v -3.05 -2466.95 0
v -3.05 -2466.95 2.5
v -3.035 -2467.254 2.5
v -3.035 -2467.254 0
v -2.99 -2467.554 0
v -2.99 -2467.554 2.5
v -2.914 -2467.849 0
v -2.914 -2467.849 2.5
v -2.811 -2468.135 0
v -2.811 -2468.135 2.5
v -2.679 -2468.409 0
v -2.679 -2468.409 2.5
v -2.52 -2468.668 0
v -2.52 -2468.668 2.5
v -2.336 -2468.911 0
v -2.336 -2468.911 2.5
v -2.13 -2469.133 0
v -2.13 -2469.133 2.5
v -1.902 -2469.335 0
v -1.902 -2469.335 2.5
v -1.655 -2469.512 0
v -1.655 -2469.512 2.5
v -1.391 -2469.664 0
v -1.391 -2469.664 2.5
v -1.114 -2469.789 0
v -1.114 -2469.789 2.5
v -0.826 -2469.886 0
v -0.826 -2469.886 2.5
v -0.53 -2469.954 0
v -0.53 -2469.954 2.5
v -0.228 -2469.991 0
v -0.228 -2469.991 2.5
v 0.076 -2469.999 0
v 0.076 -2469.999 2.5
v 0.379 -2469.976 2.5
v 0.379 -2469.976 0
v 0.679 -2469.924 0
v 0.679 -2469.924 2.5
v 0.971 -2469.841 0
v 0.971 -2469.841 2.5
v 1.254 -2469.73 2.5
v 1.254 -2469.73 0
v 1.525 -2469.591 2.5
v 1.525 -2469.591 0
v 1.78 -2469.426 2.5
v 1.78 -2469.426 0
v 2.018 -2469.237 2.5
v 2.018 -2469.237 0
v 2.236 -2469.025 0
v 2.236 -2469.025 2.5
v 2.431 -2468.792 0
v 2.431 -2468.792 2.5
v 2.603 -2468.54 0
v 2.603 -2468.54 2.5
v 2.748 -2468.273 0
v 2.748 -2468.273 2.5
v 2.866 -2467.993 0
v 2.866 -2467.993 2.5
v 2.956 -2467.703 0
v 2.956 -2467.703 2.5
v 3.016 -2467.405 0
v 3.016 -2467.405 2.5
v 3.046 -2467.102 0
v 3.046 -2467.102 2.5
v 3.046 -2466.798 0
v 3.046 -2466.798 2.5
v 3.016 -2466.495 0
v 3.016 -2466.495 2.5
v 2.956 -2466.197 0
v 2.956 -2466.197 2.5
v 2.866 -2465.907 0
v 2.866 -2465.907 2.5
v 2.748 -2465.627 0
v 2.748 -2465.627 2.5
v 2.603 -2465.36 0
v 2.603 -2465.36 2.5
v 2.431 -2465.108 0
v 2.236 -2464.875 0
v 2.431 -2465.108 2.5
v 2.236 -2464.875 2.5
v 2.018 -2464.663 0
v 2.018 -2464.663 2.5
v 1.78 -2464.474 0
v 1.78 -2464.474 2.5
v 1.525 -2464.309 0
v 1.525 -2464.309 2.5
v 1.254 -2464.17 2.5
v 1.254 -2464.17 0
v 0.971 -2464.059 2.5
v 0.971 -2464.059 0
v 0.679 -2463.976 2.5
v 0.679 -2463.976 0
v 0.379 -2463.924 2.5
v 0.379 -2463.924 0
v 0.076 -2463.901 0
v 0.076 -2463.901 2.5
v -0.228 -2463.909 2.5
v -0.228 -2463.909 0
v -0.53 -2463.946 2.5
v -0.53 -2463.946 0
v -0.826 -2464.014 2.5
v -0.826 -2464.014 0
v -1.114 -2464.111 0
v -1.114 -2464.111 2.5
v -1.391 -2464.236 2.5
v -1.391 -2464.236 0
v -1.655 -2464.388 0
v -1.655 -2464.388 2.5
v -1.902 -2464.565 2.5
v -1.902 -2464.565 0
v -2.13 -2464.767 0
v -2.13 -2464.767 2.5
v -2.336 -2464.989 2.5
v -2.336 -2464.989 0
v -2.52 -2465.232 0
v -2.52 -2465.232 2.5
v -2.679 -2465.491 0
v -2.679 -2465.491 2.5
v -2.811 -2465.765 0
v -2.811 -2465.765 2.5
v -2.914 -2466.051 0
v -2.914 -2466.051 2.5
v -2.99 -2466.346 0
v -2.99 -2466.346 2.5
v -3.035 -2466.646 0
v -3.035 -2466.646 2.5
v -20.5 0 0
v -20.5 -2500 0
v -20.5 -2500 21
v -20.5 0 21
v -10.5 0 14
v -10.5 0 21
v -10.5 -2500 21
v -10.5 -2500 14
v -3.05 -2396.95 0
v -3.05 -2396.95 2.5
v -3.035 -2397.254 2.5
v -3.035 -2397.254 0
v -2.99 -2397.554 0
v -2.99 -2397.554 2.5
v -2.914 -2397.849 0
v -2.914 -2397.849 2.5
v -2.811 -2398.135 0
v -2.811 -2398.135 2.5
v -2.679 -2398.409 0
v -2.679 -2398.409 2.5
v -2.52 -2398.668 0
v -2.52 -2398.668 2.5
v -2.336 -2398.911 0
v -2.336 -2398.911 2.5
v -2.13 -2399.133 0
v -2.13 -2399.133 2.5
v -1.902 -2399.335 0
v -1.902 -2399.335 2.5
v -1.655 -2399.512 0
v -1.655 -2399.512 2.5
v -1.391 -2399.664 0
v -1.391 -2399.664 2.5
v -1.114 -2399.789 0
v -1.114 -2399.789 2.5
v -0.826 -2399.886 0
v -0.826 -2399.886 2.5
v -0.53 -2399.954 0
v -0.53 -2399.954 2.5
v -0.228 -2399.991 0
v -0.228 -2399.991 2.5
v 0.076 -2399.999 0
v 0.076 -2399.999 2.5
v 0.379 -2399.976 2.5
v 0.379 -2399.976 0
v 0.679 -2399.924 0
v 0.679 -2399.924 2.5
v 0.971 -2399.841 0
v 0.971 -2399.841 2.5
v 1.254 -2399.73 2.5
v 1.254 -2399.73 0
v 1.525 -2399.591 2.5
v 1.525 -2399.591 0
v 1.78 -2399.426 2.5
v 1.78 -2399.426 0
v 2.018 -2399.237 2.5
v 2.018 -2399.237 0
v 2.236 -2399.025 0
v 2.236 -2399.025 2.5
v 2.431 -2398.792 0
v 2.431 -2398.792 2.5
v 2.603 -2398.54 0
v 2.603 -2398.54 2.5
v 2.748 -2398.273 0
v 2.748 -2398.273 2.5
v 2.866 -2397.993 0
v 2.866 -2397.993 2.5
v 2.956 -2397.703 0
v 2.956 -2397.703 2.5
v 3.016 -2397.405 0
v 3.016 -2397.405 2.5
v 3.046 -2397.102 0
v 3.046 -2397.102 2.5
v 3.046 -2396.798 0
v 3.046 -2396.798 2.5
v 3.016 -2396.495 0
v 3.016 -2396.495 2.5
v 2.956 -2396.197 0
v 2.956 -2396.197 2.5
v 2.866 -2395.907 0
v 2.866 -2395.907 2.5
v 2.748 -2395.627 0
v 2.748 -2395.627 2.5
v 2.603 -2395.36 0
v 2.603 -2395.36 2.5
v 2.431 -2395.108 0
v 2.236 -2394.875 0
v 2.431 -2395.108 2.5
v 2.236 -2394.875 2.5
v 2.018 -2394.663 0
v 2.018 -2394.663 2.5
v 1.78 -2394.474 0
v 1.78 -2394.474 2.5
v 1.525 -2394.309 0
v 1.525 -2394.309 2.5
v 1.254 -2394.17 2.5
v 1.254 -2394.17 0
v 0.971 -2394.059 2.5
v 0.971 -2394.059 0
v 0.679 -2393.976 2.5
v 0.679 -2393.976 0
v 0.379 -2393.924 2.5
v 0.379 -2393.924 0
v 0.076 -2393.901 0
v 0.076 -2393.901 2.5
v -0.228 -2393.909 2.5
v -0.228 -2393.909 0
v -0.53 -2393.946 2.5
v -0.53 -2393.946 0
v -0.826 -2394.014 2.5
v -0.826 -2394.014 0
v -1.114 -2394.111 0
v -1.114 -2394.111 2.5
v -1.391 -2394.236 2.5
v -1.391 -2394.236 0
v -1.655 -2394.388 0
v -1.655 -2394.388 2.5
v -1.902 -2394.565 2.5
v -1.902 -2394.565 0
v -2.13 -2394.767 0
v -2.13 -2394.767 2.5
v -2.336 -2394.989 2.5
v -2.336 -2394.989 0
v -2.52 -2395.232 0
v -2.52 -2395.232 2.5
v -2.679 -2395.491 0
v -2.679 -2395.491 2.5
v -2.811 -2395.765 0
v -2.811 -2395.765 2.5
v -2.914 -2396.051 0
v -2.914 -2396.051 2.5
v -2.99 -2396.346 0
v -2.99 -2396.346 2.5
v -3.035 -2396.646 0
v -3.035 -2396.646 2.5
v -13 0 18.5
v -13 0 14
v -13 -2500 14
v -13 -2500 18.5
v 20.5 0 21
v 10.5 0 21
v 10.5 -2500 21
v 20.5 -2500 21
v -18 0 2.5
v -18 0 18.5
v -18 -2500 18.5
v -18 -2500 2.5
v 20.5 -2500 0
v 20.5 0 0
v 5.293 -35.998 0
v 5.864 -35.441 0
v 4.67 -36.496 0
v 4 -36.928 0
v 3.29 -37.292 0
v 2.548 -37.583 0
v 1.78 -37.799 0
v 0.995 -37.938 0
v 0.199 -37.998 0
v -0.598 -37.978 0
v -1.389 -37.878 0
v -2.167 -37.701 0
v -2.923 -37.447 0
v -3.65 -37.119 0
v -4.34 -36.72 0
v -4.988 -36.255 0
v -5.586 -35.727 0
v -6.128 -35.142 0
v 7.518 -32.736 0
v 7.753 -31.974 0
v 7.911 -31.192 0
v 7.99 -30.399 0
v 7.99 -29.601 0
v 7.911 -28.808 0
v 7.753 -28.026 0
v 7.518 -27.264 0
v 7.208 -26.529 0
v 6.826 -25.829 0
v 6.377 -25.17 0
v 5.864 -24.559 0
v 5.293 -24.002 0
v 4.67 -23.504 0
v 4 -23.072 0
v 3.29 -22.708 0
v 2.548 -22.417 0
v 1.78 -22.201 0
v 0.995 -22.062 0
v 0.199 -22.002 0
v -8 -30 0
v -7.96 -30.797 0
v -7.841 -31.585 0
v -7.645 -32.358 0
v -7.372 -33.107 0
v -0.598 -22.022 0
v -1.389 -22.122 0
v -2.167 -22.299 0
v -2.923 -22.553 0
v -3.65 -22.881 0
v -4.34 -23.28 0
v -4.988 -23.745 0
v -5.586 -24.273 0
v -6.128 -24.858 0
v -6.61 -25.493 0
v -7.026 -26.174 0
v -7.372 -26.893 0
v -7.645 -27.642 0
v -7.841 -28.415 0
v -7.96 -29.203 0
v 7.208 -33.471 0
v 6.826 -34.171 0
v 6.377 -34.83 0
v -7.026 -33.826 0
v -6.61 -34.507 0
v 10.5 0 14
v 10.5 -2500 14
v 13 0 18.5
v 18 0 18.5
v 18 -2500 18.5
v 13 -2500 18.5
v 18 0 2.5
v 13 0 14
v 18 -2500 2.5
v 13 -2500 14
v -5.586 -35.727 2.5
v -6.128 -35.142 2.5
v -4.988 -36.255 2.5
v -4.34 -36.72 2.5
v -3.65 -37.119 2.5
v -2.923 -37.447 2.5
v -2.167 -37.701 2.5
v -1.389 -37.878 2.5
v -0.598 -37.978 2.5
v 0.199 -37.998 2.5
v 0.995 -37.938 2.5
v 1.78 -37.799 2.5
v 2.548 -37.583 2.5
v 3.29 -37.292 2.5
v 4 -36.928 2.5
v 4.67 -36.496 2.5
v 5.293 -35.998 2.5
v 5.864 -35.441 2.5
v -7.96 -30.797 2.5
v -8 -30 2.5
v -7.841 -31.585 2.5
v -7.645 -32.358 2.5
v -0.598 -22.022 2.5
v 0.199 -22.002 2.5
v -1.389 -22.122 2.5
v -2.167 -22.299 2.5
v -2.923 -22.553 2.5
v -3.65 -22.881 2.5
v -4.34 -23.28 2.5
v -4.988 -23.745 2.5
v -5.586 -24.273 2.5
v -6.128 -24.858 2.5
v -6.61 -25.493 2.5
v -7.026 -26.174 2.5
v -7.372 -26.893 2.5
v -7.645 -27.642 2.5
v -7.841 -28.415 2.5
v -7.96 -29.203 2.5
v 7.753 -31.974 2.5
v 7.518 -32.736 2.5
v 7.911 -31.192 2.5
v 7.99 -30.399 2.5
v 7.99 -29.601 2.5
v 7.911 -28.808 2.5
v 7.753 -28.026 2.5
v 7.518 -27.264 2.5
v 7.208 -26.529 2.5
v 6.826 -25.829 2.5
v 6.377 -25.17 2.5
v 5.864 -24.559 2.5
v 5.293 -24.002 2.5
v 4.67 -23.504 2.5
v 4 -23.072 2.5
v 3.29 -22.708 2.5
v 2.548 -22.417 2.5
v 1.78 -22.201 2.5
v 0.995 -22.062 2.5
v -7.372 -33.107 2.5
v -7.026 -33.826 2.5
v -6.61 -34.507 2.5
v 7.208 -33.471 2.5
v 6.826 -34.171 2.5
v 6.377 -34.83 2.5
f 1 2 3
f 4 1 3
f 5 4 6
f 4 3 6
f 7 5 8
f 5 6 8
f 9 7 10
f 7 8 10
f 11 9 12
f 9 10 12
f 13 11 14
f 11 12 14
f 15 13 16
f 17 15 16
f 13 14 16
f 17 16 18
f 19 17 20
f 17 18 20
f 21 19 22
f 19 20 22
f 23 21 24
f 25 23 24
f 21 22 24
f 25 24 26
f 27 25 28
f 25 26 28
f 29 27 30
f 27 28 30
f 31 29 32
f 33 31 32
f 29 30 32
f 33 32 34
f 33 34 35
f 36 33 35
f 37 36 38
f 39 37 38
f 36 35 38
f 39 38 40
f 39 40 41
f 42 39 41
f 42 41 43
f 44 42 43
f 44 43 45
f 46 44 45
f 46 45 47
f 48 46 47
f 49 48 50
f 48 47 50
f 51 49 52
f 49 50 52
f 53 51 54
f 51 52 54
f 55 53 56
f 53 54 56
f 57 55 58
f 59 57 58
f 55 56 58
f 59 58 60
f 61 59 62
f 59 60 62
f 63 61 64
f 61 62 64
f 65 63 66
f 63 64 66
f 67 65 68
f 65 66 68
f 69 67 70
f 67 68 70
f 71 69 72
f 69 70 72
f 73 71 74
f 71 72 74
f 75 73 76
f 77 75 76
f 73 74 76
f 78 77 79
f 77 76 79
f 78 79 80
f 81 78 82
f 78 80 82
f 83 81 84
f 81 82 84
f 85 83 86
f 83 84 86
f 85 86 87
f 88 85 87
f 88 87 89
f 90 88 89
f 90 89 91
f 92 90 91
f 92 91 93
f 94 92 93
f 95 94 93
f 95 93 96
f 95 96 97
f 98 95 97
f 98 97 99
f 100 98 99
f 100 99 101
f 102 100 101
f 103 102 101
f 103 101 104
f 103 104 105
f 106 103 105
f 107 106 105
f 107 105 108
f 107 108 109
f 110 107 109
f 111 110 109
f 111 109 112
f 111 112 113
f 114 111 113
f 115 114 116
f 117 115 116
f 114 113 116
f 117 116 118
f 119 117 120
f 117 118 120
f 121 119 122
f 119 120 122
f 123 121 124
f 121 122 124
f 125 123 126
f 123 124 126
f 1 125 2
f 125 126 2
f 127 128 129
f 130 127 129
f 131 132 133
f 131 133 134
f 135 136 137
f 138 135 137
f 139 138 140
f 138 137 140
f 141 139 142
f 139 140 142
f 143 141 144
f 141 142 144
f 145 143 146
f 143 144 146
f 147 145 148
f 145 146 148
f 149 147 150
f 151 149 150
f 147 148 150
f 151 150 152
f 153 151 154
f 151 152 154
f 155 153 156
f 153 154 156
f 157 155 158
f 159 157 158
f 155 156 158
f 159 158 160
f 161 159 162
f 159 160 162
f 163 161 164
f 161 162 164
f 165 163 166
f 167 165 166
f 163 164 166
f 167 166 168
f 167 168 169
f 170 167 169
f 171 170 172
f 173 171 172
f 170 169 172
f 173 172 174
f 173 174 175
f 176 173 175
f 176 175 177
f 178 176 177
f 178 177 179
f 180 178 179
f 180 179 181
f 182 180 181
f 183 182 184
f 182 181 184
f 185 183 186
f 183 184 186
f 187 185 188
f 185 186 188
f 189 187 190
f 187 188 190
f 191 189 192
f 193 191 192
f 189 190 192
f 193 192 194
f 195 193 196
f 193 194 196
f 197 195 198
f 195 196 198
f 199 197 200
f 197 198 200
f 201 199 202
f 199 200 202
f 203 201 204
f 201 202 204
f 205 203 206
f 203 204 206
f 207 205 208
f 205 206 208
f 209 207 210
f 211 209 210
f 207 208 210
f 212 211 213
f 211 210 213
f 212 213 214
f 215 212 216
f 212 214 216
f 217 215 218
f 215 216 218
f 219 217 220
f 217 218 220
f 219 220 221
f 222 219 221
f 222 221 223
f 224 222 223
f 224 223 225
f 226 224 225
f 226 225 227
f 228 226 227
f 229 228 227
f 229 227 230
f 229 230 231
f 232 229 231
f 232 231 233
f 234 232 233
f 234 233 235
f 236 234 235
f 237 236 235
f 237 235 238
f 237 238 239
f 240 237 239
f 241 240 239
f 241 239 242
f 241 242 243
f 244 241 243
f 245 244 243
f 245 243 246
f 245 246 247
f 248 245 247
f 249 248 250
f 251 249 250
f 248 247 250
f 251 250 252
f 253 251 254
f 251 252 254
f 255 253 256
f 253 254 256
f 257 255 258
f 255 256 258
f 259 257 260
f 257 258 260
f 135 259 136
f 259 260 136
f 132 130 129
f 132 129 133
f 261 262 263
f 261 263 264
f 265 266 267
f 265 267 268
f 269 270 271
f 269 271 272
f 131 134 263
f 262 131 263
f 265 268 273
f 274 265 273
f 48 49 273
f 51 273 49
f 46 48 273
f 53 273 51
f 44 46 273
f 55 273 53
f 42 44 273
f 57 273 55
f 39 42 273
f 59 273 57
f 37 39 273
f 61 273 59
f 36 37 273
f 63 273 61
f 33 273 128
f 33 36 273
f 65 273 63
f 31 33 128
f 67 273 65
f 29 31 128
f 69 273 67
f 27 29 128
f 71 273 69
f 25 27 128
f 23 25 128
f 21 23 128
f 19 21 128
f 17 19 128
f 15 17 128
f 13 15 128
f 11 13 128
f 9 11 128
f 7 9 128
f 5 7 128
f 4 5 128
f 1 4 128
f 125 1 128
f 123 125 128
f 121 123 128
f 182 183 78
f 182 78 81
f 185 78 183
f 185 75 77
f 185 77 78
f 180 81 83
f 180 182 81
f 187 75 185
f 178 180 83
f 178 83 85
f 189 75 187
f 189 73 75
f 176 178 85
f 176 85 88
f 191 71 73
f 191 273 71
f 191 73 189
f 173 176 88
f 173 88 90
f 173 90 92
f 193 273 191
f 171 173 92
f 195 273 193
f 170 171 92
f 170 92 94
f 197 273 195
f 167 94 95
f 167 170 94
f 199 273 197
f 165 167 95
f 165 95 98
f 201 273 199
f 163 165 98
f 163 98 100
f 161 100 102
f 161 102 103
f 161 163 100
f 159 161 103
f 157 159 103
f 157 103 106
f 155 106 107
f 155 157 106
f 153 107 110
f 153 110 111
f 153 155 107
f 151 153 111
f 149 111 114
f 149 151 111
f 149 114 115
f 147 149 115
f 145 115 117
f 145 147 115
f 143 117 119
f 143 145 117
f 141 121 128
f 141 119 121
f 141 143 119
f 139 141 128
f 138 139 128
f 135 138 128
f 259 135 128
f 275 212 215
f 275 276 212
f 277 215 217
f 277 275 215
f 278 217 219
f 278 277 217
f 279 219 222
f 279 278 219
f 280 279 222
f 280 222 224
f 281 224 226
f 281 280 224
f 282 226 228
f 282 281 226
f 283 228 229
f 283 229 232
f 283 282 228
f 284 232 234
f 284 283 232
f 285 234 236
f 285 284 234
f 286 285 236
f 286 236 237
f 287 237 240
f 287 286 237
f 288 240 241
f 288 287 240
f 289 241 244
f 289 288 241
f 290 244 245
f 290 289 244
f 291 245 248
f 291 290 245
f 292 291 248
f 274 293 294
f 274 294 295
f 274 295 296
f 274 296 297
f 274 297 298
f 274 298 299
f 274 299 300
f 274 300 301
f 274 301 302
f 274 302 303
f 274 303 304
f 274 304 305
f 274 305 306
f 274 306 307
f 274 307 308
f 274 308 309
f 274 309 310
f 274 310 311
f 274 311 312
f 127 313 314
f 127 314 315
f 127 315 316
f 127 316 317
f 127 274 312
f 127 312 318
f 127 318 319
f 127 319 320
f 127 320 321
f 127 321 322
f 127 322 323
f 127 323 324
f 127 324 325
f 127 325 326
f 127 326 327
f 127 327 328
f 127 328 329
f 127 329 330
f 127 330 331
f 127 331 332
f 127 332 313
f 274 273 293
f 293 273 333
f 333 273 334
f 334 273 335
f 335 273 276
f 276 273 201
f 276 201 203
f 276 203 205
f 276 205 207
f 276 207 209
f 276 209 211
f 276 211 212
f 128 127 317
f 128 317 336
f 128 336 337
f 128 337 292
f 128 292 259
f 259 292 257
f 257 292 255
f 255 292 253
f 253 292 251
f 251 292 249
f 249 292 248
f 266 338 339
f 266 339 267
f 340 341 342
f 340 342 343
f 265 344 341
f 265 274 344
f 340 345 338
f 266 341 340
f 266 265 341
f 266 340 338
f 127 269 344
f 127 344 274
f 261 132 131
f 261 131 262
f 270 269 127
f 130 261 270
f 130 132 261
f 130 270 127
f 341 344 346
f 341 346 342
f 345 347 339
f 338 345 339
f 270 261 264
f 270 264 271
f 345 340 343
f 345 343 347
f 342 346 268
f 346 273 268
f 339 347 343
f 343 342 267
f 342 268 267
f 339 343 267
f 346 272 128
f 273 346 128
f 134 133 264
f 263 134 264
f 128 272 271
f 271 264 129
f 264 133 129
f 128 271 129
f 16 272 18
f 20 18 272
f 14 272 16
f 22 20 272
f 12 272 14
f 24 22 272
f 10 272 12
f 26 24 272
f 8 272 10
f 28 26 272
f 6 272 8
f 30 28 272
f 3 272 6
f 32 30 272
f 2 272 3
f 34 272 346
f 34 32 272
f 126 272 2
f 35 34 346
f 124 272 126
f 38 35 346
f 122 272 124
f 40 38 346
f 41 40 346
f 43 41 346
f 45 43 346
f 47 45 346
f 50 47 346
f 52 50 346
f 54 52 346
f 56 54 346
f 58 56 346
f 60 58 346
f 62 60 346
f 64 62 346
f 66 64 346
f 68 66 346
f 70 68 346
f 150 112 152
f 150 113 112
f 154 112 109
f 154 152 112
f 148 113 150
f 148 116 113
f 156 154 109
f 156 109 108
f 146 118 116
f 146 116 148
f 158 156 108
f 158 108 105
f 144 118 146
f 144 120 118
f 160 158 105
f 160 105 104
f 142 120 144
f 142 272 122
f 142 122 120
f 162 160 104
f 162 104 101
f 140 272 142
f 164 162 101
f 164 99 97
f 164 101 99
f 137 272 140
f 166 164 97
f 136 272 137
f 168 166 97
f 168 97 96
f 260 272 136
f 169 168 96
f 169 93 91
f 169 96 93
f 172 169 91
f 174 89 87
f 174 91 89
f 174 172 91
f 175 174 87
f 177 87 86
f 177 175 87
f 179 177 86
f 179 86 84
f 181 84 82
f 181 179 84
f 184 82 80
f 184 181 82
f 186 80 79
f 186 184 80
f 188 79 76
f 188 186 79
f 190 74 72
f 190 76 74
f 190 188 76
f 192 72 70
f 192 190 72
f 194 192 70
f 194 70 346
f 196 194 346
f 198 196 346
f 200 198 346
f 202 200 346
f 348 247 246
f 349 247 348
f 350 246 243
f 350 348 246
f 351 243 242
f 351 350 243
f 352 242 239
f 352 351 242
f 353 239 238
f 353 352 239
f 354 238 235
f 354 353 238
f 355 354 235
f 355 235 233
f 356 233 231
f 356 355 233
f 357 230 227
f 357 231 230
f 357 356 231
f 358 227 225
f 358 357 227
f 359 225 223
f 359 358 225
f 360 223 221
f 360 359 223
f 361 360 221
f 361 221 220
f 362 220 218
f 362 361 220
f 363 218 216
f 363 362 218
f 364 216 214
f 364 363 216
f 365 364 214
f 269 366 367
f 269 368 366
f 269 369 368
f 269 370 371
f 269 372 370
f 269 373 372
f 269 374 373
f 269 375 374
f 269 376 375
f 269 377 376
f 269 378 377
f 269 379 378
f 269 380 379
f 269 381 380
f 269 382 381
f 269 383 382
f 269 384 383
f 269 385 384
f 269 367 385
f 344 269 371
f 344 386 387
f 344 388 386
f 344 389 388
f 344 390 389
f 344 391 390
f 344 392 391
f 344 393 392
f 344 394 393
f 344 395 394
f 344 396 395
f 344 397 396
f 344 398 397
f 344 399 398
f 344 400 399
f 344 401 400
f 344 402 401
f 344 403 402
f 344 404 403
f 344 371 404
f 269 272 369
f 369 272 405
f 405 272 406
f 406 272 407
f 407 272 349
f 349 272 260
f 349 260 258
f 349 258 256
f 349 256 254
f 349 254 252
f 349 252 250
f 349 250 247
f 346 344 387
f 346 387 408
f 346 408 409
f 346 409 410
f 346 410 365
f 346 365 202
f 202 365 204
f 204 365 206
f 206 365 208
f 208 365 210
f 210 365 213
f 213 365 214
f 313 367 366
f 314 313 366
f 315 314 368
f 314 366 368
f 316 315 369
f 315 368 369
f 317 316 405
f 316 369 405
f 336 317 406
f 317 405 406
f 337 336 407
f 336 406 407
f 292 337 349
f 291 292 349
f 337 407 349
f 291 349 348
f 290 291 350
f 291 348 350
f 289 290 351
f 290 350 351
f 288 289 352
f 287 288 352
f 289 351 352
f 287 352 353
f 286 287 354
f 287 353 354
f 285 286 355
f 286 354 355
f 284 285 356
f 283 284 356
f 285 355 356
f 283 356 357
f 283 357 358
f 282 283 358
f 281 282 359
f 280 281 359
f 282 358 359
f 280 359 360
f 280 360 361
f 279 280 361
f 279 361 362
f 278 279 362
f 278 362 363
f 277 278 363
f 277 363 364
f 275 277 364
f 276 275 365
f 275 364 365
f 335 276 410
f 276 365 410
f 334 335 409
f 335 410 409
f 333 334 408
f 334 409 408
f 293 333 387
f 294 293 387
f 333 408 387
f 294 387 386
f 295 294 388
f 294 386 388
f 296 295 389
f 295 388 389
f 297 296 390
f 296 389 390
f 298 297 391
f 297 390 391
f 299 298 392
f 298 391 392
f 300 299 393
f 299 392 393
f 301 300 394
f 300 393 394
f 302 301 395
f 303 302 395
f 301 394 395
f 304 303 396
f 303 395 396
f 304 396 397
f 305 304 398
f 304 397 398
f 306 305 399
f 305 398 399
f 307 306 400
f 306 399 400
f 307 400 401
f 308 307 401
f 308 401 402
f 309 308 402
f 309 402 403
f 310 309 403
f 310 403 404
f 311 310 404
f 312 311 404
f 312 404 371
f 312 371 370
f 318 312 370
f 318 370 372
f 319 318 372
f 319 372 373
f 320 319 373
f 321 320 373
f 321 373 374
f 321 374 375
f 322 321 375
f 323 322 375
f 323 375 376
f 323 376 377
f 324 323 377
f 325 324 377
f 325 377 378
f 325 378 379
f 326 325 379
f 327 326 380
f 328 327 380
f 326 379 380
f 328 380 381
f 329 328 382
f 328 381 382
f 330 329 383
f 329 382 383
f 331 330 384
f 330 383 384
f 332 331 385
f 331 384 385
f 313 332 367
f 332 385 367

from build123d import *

# Parameters (mm, degrees)
PAD_DEPTH    = 2500
SKETCH_R     = 8
SKETCH_R_2   = 3.05
POCKET_DEPTH = 2.5


with BuildPart() as part:
    # Sketch002 → Pad (new body)
    with BuildSketch(Plane.XZ):
        Polygon((-20.5, 0), (-20.5, 21), (-10.5, 21), (-10.5, 14), (-13, 14), (-13, 18.5), (-18, 18.5), (-18, 2.5), (18, 2.5), (18, 18.5), (13, 18.5), (13, 14), (10.5, 14), (10.5, 21), (20.5, 21), (20.5, 0), align=None)
    extrude(amount=PAD_DEPTH)

    # Sketch (on Face10 of Pad) → Pocket (cut)
    with BuildSketch(Plane(origin=(0, 0, 2.5), x_dir=(-1, 0, 0), z_dir=(0, 0, 1))):
        with Locations((0, 30)):
            Circle(SKETCH_R)
        with Locations((0, 2466.95)):
            Circle(SKETCH_R_2)
        with Locations((0, 2396.95)):
            Circle(SKETCH_R_2)
    extrude(amount=-POCKET_DEPTH, mode=Mode.SUBTRACT)


solid = part.part
